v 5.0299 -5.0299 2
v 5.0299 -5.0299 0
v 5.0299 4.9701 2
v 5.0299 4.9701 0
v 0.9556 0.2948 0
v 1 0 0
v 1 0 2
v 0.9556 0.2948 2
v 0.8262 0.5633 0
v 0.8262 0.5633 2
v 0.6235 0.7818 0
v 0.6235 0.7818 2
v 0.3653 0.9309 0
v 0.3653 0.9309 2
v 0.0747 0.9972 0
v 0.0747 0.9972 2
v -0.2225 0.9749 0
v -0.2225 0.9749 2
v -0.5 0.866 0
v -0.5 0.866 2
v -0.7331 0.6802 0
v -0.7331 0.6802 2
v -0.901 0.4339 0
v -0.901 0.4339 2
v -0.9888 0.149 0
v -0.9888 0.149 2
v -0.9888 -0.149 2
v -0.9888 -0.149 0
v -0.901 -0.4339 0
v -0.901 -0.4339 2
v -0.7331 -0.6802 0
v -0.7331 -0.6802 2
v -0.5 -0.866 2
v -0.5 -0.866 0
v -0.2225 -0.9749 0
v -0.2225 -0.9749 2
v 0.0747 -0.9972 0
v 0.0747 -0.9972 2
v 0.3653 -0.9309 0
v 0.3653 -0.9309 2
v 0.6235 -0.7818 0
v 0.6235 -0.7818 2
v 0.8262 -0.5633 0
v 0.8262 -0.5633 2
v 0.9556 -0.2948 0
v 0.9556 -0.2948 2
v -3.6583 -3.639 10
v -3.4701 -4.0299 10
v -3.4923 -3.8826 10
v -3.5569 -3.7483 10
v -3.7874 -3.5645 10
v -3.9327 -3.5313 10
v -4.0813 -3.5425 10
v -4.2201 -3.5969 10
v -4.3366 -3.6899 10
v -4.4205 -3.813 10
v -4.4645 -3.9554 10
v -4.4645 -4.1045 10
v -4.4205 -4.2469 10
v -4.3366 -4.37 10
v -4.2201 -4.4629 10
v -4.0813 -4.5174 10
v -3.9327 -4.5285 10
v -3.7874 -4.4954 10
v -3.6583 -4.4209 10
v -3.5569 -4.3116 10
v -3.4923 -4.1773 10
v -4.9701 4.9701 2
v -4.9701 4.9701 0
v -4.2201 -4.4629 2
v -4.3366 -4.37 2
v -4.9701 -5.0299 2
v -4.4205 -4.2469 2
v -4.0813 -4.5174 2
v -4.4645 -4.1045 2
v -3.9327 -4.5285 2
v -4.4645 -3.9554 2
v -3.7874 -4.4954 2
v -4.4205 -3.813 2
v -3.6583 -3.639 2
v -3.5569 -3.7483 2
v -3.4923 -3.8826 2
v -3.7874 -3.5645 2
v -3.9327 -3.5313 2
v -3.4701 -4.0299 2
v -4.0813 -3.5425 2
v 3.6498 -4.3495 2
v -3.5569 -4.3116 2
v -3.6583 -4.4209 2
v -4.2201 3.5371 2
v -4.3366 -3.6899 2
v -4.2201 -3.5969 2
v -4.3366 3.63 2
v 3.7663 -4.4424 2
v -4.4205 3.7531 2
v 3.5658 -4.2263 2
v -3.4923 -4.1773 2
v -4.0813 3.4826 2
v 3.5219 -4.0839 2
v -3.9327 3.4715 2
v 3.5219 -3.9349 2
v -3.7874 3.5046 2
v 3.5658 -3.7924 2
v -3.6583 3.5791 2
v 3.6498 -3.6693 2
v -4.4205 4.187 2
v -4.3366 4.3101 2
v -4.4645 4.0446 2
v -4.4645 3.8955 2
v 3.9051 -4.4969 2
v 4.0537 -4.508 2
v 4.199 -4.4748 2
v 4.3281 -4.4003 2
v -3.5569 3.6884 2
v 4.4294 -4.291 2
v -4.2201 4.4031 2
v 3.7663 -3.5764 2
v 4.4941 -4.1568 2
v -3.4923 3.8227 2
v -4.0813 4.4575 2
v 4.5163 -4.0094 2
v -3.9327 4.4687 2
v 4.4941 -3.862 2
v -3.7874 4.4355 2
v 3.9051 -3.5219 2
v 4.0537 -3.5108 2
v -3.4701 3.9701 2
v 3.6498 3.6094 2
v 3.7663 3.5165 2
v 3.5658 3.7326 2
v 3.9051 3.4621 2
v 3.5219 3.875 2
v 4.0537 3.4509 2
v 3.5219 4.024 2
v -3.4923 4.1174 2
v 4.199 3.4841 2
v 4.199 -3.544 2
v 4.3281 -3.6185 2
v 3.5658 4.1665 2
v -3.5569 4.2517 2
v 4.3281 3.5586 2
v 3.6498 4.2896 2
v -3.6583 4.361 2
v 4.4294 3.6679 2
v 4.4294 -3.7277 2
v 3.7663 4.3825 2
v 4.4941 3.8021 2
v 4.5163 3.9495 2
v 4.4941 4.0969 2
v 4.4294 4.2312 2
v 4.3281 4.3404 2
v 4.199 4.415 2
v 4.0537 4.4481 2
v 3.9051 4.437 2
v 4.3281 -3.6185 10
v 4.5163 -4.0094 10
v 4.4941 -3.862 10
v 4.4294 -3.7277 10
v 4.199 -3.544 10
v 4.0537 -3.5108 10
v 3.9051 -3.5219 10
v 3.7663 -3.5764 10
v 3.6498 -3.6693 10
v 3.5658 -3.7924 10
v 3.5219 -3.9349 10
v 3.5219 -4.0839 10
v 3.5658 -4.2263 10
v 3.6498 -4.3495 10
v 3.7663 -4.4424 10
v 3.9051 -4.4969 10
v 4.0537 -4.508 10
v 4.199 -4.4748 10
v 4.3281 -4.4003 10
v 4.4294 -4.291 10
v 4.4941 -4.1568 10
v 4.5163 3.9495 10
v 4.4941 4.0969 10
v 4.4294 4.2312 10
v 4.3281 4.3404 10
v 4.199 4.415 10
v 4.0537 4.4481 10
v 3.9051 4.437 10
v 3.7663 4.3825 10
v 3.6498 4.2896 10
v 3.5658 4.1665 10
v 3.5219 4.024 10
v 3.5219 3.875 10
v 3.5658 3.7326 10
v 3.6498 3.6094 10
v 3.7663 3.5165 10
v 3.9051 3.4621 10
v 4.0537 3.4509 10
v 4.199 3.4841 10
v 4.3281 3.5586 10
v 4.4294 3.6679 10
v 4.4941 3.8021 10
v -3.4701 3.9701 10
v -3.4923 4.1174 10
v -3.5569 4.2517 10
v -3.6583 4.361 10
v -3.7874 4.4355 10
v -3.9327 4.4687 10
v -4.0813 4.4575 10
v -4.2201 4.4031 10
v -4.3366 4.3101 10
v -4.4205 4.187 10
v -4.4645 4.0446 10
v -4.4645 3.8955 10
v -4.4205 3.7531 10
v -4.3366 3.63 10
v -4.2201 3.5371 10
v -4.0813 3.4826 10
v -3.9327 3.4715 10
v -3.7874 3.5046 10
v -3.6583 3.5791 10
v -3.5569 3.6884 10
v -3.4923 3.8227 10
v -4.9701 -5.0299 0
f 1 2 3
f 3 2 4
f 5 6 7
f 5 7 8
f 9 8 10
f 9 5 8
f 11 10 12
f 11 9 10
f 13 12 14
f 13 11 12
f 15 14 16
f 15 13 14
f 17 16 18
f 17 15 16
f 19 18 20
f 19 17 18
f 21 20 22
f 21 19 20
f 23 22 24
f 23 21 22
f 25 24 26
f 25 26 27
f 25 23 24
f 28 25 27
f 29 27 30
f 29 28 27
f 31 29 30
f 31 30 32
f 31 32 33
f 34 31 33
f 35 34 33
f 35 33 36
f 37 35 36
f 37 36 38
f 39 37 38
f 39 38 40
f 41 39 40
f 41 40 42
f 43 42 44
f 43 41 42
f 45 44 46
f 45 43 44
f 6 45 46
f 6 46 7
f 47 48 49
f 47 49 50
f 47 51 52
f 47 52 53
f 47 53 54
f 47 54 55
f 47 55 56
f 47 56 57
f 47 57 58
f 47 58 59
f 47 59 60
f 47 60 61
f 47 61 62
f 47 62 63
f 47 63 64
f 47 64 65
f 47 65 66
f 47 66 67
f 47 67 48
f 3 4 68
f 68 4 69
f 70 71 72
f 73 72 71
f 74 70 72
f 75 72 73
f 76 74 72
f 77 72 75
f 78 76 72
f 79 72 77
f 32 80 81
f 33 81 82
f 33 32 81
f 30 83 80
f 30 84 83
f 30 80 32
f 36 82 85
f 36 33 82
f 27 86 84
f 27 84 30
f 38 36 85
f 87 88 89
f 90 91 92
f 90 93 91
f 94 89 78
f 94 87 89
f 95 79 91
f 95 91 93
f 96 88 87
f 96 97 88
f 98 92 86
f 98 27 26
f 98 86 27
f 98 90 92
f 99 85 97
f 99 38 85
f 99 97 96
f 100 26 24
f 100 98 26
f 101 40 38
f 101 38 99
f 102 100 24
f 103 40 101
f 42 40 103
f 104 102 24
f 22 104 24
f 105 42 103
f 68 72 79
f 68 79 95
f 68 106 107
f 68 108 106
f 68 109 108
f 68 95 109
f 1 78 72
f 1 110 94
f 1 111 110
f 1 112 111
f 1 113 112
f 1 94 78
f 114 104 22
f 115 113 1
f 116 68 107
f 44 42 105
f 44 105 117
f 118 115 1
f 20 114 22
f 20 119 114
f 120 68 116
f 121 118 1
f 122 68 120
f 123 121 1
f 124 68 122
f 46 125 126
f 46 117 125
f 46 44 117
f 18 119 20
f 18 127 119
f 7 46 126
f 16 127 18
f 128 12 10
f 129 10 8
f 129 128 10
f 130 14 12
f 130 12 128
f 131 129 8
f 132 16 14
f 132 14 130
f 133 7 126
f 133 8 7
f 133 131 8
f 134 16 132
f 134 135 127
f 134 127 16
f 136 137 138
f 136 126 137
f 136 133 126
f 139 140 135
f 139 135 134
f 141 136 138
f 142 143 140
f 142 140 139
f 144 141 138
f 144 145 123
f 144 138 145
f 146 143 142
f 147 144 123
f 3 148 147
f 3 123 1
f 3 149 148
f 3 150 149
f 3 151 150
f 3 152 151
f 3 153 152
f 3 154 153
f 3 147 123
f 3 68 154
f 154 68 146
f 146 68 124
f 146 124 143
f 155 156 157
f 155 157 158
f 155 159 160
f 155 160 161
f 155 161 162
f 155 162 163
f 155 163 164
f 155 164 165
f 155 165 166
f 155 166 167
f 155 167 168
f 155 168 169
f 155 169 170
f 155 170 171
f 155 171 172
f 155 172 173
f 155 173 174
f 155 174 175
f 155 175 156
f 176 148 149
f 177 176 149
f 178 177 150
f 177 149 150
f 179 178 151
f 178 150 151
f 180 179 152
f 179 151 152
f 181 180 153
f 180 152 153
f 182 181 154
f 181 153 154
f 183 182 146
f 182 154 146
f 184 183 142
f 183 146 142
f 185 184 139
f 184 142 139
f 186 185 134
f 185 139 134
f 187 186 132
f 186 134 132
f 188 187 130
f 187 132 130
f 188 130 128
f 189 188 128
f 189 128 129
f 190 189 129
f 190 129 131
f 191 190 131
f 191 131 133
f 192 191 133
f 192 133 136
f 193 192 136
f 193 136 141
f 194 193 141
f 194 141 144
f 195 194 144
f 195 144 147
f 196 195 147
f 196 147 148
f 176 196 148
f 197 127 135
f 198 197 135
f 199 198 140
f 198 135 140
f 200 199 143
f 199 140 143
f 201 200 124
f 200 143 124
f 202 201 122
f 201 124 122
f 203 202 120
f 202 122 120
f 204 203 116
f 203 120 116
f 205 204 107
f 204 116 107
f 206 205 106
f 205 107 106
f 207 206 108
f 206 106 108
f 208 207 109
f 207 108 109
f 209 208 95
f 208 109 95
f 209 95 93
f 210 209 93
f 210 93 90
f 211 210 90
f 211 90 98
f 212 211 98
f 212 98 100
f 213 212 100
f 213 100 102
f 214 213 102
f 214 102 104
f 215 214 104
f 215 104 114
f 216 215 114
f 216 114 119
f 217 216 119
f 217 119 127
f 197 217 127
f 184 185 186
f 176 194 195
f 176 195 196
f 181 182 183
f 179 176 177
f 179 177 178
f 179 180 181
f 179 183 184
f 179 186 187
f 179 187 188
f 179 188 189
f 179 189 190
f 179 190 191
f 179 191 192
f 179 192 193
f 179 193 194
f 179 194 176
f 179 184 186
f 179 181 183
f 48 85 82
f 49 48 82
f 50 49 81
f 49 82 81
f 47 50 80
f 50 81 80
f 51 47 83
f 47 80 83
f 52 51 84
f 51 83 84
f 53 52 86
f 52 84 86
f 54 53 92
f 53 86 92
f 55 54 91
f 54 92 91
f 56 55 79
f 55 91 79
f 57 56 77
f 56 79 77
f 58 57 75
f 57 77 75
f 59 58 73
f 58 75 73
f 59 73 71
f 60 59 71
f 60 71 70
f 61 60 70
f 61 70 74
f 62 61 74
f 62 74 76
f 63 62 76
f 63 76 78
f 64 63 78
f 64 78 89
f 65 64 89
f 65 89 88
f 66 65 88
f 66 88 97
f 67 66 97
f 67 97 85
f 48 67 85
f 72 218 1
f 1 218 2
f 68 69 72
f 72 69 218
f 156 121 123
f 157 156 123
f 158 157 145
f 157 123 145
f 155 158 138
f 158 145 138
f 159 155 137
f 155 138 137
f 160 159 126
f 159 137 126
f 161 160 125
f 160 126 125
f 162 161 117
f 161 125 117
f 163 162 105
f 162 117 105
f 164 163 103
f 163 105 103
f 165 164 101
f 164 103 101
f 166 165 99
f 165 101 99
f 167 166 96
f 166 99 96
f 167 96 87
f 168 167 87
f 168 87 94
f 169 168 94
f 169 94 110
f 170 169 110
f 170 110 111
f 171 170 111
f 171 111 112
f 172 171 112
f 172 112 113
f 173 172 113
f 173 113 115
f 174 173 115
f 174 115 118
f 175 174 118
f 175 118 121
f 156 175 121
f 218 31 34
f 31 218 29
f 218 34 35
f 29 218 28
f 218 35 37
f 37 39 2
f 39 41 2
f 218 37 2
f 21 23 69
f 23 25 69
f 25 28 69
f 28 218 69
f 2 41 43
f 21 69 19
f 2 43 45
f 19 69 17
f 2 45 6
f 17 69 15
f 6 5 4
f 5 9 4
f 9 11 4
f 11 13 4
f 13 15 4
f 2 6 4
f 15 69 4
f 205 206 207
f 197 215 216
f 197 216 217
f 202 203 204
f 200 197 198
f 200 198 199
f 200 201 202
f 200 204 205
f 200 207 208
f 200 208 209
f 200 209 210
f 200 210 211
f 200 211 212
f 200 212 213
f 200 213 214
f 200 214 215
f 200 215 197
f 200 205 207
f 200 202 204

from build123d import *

# Parameters (mm, degrees)
F0_R     = 0.5
F0_R_2   = 1
F1_DEPTH = 2
F2_DEPTH = 10


with BuildPart() as f1:
    # F0 (on Top) → F1 (new body)
    with BuildSketch(Plane.XY):
        Polygon((5.029937, -5.029937), (5.029937, 4.970063), (-4.970063, 4.970063), (-4.970063, -0.907308), (-4.970063, -5.029937), align=None)
        with Locations((-3.970063, -4.029937)):
            Circle(F0_R, mode=Mode.SUBTRACT)
        with Locations((4.016325, -4.009387)):
            Circle(F0_R, mode=Mode.SUBTRACT)
        Circle(F0_R_2, mode=Mode.SUBTRACT)
        with Locations((-3.970063, 3.970063)):
            Circle(F0_R, mode=Mode.SUBTRACT)
        with Locations((4.016325, 3.949514)):
            Circle(F0_R, mode=Mode.SUBTRACT)
    extrude(amount=F1_DEPTH)

    # F0 (on Top) → F2 (join)
    with BuildSketch(Plane.XY):
        with Locations((-3.970063, 3.970063)):
            Circle(F0_R)
        with Locations((4.016325, 3.949514)):
            Circle(F0_R)
        with Locations((4.016325, -4.009387)):
            Circle(F0_R)
        with Locations((-3.970063, -4.029937)):
            Circle(F0_R)
    extrude(amount=F2_DEPTH)


solid = f1.part
